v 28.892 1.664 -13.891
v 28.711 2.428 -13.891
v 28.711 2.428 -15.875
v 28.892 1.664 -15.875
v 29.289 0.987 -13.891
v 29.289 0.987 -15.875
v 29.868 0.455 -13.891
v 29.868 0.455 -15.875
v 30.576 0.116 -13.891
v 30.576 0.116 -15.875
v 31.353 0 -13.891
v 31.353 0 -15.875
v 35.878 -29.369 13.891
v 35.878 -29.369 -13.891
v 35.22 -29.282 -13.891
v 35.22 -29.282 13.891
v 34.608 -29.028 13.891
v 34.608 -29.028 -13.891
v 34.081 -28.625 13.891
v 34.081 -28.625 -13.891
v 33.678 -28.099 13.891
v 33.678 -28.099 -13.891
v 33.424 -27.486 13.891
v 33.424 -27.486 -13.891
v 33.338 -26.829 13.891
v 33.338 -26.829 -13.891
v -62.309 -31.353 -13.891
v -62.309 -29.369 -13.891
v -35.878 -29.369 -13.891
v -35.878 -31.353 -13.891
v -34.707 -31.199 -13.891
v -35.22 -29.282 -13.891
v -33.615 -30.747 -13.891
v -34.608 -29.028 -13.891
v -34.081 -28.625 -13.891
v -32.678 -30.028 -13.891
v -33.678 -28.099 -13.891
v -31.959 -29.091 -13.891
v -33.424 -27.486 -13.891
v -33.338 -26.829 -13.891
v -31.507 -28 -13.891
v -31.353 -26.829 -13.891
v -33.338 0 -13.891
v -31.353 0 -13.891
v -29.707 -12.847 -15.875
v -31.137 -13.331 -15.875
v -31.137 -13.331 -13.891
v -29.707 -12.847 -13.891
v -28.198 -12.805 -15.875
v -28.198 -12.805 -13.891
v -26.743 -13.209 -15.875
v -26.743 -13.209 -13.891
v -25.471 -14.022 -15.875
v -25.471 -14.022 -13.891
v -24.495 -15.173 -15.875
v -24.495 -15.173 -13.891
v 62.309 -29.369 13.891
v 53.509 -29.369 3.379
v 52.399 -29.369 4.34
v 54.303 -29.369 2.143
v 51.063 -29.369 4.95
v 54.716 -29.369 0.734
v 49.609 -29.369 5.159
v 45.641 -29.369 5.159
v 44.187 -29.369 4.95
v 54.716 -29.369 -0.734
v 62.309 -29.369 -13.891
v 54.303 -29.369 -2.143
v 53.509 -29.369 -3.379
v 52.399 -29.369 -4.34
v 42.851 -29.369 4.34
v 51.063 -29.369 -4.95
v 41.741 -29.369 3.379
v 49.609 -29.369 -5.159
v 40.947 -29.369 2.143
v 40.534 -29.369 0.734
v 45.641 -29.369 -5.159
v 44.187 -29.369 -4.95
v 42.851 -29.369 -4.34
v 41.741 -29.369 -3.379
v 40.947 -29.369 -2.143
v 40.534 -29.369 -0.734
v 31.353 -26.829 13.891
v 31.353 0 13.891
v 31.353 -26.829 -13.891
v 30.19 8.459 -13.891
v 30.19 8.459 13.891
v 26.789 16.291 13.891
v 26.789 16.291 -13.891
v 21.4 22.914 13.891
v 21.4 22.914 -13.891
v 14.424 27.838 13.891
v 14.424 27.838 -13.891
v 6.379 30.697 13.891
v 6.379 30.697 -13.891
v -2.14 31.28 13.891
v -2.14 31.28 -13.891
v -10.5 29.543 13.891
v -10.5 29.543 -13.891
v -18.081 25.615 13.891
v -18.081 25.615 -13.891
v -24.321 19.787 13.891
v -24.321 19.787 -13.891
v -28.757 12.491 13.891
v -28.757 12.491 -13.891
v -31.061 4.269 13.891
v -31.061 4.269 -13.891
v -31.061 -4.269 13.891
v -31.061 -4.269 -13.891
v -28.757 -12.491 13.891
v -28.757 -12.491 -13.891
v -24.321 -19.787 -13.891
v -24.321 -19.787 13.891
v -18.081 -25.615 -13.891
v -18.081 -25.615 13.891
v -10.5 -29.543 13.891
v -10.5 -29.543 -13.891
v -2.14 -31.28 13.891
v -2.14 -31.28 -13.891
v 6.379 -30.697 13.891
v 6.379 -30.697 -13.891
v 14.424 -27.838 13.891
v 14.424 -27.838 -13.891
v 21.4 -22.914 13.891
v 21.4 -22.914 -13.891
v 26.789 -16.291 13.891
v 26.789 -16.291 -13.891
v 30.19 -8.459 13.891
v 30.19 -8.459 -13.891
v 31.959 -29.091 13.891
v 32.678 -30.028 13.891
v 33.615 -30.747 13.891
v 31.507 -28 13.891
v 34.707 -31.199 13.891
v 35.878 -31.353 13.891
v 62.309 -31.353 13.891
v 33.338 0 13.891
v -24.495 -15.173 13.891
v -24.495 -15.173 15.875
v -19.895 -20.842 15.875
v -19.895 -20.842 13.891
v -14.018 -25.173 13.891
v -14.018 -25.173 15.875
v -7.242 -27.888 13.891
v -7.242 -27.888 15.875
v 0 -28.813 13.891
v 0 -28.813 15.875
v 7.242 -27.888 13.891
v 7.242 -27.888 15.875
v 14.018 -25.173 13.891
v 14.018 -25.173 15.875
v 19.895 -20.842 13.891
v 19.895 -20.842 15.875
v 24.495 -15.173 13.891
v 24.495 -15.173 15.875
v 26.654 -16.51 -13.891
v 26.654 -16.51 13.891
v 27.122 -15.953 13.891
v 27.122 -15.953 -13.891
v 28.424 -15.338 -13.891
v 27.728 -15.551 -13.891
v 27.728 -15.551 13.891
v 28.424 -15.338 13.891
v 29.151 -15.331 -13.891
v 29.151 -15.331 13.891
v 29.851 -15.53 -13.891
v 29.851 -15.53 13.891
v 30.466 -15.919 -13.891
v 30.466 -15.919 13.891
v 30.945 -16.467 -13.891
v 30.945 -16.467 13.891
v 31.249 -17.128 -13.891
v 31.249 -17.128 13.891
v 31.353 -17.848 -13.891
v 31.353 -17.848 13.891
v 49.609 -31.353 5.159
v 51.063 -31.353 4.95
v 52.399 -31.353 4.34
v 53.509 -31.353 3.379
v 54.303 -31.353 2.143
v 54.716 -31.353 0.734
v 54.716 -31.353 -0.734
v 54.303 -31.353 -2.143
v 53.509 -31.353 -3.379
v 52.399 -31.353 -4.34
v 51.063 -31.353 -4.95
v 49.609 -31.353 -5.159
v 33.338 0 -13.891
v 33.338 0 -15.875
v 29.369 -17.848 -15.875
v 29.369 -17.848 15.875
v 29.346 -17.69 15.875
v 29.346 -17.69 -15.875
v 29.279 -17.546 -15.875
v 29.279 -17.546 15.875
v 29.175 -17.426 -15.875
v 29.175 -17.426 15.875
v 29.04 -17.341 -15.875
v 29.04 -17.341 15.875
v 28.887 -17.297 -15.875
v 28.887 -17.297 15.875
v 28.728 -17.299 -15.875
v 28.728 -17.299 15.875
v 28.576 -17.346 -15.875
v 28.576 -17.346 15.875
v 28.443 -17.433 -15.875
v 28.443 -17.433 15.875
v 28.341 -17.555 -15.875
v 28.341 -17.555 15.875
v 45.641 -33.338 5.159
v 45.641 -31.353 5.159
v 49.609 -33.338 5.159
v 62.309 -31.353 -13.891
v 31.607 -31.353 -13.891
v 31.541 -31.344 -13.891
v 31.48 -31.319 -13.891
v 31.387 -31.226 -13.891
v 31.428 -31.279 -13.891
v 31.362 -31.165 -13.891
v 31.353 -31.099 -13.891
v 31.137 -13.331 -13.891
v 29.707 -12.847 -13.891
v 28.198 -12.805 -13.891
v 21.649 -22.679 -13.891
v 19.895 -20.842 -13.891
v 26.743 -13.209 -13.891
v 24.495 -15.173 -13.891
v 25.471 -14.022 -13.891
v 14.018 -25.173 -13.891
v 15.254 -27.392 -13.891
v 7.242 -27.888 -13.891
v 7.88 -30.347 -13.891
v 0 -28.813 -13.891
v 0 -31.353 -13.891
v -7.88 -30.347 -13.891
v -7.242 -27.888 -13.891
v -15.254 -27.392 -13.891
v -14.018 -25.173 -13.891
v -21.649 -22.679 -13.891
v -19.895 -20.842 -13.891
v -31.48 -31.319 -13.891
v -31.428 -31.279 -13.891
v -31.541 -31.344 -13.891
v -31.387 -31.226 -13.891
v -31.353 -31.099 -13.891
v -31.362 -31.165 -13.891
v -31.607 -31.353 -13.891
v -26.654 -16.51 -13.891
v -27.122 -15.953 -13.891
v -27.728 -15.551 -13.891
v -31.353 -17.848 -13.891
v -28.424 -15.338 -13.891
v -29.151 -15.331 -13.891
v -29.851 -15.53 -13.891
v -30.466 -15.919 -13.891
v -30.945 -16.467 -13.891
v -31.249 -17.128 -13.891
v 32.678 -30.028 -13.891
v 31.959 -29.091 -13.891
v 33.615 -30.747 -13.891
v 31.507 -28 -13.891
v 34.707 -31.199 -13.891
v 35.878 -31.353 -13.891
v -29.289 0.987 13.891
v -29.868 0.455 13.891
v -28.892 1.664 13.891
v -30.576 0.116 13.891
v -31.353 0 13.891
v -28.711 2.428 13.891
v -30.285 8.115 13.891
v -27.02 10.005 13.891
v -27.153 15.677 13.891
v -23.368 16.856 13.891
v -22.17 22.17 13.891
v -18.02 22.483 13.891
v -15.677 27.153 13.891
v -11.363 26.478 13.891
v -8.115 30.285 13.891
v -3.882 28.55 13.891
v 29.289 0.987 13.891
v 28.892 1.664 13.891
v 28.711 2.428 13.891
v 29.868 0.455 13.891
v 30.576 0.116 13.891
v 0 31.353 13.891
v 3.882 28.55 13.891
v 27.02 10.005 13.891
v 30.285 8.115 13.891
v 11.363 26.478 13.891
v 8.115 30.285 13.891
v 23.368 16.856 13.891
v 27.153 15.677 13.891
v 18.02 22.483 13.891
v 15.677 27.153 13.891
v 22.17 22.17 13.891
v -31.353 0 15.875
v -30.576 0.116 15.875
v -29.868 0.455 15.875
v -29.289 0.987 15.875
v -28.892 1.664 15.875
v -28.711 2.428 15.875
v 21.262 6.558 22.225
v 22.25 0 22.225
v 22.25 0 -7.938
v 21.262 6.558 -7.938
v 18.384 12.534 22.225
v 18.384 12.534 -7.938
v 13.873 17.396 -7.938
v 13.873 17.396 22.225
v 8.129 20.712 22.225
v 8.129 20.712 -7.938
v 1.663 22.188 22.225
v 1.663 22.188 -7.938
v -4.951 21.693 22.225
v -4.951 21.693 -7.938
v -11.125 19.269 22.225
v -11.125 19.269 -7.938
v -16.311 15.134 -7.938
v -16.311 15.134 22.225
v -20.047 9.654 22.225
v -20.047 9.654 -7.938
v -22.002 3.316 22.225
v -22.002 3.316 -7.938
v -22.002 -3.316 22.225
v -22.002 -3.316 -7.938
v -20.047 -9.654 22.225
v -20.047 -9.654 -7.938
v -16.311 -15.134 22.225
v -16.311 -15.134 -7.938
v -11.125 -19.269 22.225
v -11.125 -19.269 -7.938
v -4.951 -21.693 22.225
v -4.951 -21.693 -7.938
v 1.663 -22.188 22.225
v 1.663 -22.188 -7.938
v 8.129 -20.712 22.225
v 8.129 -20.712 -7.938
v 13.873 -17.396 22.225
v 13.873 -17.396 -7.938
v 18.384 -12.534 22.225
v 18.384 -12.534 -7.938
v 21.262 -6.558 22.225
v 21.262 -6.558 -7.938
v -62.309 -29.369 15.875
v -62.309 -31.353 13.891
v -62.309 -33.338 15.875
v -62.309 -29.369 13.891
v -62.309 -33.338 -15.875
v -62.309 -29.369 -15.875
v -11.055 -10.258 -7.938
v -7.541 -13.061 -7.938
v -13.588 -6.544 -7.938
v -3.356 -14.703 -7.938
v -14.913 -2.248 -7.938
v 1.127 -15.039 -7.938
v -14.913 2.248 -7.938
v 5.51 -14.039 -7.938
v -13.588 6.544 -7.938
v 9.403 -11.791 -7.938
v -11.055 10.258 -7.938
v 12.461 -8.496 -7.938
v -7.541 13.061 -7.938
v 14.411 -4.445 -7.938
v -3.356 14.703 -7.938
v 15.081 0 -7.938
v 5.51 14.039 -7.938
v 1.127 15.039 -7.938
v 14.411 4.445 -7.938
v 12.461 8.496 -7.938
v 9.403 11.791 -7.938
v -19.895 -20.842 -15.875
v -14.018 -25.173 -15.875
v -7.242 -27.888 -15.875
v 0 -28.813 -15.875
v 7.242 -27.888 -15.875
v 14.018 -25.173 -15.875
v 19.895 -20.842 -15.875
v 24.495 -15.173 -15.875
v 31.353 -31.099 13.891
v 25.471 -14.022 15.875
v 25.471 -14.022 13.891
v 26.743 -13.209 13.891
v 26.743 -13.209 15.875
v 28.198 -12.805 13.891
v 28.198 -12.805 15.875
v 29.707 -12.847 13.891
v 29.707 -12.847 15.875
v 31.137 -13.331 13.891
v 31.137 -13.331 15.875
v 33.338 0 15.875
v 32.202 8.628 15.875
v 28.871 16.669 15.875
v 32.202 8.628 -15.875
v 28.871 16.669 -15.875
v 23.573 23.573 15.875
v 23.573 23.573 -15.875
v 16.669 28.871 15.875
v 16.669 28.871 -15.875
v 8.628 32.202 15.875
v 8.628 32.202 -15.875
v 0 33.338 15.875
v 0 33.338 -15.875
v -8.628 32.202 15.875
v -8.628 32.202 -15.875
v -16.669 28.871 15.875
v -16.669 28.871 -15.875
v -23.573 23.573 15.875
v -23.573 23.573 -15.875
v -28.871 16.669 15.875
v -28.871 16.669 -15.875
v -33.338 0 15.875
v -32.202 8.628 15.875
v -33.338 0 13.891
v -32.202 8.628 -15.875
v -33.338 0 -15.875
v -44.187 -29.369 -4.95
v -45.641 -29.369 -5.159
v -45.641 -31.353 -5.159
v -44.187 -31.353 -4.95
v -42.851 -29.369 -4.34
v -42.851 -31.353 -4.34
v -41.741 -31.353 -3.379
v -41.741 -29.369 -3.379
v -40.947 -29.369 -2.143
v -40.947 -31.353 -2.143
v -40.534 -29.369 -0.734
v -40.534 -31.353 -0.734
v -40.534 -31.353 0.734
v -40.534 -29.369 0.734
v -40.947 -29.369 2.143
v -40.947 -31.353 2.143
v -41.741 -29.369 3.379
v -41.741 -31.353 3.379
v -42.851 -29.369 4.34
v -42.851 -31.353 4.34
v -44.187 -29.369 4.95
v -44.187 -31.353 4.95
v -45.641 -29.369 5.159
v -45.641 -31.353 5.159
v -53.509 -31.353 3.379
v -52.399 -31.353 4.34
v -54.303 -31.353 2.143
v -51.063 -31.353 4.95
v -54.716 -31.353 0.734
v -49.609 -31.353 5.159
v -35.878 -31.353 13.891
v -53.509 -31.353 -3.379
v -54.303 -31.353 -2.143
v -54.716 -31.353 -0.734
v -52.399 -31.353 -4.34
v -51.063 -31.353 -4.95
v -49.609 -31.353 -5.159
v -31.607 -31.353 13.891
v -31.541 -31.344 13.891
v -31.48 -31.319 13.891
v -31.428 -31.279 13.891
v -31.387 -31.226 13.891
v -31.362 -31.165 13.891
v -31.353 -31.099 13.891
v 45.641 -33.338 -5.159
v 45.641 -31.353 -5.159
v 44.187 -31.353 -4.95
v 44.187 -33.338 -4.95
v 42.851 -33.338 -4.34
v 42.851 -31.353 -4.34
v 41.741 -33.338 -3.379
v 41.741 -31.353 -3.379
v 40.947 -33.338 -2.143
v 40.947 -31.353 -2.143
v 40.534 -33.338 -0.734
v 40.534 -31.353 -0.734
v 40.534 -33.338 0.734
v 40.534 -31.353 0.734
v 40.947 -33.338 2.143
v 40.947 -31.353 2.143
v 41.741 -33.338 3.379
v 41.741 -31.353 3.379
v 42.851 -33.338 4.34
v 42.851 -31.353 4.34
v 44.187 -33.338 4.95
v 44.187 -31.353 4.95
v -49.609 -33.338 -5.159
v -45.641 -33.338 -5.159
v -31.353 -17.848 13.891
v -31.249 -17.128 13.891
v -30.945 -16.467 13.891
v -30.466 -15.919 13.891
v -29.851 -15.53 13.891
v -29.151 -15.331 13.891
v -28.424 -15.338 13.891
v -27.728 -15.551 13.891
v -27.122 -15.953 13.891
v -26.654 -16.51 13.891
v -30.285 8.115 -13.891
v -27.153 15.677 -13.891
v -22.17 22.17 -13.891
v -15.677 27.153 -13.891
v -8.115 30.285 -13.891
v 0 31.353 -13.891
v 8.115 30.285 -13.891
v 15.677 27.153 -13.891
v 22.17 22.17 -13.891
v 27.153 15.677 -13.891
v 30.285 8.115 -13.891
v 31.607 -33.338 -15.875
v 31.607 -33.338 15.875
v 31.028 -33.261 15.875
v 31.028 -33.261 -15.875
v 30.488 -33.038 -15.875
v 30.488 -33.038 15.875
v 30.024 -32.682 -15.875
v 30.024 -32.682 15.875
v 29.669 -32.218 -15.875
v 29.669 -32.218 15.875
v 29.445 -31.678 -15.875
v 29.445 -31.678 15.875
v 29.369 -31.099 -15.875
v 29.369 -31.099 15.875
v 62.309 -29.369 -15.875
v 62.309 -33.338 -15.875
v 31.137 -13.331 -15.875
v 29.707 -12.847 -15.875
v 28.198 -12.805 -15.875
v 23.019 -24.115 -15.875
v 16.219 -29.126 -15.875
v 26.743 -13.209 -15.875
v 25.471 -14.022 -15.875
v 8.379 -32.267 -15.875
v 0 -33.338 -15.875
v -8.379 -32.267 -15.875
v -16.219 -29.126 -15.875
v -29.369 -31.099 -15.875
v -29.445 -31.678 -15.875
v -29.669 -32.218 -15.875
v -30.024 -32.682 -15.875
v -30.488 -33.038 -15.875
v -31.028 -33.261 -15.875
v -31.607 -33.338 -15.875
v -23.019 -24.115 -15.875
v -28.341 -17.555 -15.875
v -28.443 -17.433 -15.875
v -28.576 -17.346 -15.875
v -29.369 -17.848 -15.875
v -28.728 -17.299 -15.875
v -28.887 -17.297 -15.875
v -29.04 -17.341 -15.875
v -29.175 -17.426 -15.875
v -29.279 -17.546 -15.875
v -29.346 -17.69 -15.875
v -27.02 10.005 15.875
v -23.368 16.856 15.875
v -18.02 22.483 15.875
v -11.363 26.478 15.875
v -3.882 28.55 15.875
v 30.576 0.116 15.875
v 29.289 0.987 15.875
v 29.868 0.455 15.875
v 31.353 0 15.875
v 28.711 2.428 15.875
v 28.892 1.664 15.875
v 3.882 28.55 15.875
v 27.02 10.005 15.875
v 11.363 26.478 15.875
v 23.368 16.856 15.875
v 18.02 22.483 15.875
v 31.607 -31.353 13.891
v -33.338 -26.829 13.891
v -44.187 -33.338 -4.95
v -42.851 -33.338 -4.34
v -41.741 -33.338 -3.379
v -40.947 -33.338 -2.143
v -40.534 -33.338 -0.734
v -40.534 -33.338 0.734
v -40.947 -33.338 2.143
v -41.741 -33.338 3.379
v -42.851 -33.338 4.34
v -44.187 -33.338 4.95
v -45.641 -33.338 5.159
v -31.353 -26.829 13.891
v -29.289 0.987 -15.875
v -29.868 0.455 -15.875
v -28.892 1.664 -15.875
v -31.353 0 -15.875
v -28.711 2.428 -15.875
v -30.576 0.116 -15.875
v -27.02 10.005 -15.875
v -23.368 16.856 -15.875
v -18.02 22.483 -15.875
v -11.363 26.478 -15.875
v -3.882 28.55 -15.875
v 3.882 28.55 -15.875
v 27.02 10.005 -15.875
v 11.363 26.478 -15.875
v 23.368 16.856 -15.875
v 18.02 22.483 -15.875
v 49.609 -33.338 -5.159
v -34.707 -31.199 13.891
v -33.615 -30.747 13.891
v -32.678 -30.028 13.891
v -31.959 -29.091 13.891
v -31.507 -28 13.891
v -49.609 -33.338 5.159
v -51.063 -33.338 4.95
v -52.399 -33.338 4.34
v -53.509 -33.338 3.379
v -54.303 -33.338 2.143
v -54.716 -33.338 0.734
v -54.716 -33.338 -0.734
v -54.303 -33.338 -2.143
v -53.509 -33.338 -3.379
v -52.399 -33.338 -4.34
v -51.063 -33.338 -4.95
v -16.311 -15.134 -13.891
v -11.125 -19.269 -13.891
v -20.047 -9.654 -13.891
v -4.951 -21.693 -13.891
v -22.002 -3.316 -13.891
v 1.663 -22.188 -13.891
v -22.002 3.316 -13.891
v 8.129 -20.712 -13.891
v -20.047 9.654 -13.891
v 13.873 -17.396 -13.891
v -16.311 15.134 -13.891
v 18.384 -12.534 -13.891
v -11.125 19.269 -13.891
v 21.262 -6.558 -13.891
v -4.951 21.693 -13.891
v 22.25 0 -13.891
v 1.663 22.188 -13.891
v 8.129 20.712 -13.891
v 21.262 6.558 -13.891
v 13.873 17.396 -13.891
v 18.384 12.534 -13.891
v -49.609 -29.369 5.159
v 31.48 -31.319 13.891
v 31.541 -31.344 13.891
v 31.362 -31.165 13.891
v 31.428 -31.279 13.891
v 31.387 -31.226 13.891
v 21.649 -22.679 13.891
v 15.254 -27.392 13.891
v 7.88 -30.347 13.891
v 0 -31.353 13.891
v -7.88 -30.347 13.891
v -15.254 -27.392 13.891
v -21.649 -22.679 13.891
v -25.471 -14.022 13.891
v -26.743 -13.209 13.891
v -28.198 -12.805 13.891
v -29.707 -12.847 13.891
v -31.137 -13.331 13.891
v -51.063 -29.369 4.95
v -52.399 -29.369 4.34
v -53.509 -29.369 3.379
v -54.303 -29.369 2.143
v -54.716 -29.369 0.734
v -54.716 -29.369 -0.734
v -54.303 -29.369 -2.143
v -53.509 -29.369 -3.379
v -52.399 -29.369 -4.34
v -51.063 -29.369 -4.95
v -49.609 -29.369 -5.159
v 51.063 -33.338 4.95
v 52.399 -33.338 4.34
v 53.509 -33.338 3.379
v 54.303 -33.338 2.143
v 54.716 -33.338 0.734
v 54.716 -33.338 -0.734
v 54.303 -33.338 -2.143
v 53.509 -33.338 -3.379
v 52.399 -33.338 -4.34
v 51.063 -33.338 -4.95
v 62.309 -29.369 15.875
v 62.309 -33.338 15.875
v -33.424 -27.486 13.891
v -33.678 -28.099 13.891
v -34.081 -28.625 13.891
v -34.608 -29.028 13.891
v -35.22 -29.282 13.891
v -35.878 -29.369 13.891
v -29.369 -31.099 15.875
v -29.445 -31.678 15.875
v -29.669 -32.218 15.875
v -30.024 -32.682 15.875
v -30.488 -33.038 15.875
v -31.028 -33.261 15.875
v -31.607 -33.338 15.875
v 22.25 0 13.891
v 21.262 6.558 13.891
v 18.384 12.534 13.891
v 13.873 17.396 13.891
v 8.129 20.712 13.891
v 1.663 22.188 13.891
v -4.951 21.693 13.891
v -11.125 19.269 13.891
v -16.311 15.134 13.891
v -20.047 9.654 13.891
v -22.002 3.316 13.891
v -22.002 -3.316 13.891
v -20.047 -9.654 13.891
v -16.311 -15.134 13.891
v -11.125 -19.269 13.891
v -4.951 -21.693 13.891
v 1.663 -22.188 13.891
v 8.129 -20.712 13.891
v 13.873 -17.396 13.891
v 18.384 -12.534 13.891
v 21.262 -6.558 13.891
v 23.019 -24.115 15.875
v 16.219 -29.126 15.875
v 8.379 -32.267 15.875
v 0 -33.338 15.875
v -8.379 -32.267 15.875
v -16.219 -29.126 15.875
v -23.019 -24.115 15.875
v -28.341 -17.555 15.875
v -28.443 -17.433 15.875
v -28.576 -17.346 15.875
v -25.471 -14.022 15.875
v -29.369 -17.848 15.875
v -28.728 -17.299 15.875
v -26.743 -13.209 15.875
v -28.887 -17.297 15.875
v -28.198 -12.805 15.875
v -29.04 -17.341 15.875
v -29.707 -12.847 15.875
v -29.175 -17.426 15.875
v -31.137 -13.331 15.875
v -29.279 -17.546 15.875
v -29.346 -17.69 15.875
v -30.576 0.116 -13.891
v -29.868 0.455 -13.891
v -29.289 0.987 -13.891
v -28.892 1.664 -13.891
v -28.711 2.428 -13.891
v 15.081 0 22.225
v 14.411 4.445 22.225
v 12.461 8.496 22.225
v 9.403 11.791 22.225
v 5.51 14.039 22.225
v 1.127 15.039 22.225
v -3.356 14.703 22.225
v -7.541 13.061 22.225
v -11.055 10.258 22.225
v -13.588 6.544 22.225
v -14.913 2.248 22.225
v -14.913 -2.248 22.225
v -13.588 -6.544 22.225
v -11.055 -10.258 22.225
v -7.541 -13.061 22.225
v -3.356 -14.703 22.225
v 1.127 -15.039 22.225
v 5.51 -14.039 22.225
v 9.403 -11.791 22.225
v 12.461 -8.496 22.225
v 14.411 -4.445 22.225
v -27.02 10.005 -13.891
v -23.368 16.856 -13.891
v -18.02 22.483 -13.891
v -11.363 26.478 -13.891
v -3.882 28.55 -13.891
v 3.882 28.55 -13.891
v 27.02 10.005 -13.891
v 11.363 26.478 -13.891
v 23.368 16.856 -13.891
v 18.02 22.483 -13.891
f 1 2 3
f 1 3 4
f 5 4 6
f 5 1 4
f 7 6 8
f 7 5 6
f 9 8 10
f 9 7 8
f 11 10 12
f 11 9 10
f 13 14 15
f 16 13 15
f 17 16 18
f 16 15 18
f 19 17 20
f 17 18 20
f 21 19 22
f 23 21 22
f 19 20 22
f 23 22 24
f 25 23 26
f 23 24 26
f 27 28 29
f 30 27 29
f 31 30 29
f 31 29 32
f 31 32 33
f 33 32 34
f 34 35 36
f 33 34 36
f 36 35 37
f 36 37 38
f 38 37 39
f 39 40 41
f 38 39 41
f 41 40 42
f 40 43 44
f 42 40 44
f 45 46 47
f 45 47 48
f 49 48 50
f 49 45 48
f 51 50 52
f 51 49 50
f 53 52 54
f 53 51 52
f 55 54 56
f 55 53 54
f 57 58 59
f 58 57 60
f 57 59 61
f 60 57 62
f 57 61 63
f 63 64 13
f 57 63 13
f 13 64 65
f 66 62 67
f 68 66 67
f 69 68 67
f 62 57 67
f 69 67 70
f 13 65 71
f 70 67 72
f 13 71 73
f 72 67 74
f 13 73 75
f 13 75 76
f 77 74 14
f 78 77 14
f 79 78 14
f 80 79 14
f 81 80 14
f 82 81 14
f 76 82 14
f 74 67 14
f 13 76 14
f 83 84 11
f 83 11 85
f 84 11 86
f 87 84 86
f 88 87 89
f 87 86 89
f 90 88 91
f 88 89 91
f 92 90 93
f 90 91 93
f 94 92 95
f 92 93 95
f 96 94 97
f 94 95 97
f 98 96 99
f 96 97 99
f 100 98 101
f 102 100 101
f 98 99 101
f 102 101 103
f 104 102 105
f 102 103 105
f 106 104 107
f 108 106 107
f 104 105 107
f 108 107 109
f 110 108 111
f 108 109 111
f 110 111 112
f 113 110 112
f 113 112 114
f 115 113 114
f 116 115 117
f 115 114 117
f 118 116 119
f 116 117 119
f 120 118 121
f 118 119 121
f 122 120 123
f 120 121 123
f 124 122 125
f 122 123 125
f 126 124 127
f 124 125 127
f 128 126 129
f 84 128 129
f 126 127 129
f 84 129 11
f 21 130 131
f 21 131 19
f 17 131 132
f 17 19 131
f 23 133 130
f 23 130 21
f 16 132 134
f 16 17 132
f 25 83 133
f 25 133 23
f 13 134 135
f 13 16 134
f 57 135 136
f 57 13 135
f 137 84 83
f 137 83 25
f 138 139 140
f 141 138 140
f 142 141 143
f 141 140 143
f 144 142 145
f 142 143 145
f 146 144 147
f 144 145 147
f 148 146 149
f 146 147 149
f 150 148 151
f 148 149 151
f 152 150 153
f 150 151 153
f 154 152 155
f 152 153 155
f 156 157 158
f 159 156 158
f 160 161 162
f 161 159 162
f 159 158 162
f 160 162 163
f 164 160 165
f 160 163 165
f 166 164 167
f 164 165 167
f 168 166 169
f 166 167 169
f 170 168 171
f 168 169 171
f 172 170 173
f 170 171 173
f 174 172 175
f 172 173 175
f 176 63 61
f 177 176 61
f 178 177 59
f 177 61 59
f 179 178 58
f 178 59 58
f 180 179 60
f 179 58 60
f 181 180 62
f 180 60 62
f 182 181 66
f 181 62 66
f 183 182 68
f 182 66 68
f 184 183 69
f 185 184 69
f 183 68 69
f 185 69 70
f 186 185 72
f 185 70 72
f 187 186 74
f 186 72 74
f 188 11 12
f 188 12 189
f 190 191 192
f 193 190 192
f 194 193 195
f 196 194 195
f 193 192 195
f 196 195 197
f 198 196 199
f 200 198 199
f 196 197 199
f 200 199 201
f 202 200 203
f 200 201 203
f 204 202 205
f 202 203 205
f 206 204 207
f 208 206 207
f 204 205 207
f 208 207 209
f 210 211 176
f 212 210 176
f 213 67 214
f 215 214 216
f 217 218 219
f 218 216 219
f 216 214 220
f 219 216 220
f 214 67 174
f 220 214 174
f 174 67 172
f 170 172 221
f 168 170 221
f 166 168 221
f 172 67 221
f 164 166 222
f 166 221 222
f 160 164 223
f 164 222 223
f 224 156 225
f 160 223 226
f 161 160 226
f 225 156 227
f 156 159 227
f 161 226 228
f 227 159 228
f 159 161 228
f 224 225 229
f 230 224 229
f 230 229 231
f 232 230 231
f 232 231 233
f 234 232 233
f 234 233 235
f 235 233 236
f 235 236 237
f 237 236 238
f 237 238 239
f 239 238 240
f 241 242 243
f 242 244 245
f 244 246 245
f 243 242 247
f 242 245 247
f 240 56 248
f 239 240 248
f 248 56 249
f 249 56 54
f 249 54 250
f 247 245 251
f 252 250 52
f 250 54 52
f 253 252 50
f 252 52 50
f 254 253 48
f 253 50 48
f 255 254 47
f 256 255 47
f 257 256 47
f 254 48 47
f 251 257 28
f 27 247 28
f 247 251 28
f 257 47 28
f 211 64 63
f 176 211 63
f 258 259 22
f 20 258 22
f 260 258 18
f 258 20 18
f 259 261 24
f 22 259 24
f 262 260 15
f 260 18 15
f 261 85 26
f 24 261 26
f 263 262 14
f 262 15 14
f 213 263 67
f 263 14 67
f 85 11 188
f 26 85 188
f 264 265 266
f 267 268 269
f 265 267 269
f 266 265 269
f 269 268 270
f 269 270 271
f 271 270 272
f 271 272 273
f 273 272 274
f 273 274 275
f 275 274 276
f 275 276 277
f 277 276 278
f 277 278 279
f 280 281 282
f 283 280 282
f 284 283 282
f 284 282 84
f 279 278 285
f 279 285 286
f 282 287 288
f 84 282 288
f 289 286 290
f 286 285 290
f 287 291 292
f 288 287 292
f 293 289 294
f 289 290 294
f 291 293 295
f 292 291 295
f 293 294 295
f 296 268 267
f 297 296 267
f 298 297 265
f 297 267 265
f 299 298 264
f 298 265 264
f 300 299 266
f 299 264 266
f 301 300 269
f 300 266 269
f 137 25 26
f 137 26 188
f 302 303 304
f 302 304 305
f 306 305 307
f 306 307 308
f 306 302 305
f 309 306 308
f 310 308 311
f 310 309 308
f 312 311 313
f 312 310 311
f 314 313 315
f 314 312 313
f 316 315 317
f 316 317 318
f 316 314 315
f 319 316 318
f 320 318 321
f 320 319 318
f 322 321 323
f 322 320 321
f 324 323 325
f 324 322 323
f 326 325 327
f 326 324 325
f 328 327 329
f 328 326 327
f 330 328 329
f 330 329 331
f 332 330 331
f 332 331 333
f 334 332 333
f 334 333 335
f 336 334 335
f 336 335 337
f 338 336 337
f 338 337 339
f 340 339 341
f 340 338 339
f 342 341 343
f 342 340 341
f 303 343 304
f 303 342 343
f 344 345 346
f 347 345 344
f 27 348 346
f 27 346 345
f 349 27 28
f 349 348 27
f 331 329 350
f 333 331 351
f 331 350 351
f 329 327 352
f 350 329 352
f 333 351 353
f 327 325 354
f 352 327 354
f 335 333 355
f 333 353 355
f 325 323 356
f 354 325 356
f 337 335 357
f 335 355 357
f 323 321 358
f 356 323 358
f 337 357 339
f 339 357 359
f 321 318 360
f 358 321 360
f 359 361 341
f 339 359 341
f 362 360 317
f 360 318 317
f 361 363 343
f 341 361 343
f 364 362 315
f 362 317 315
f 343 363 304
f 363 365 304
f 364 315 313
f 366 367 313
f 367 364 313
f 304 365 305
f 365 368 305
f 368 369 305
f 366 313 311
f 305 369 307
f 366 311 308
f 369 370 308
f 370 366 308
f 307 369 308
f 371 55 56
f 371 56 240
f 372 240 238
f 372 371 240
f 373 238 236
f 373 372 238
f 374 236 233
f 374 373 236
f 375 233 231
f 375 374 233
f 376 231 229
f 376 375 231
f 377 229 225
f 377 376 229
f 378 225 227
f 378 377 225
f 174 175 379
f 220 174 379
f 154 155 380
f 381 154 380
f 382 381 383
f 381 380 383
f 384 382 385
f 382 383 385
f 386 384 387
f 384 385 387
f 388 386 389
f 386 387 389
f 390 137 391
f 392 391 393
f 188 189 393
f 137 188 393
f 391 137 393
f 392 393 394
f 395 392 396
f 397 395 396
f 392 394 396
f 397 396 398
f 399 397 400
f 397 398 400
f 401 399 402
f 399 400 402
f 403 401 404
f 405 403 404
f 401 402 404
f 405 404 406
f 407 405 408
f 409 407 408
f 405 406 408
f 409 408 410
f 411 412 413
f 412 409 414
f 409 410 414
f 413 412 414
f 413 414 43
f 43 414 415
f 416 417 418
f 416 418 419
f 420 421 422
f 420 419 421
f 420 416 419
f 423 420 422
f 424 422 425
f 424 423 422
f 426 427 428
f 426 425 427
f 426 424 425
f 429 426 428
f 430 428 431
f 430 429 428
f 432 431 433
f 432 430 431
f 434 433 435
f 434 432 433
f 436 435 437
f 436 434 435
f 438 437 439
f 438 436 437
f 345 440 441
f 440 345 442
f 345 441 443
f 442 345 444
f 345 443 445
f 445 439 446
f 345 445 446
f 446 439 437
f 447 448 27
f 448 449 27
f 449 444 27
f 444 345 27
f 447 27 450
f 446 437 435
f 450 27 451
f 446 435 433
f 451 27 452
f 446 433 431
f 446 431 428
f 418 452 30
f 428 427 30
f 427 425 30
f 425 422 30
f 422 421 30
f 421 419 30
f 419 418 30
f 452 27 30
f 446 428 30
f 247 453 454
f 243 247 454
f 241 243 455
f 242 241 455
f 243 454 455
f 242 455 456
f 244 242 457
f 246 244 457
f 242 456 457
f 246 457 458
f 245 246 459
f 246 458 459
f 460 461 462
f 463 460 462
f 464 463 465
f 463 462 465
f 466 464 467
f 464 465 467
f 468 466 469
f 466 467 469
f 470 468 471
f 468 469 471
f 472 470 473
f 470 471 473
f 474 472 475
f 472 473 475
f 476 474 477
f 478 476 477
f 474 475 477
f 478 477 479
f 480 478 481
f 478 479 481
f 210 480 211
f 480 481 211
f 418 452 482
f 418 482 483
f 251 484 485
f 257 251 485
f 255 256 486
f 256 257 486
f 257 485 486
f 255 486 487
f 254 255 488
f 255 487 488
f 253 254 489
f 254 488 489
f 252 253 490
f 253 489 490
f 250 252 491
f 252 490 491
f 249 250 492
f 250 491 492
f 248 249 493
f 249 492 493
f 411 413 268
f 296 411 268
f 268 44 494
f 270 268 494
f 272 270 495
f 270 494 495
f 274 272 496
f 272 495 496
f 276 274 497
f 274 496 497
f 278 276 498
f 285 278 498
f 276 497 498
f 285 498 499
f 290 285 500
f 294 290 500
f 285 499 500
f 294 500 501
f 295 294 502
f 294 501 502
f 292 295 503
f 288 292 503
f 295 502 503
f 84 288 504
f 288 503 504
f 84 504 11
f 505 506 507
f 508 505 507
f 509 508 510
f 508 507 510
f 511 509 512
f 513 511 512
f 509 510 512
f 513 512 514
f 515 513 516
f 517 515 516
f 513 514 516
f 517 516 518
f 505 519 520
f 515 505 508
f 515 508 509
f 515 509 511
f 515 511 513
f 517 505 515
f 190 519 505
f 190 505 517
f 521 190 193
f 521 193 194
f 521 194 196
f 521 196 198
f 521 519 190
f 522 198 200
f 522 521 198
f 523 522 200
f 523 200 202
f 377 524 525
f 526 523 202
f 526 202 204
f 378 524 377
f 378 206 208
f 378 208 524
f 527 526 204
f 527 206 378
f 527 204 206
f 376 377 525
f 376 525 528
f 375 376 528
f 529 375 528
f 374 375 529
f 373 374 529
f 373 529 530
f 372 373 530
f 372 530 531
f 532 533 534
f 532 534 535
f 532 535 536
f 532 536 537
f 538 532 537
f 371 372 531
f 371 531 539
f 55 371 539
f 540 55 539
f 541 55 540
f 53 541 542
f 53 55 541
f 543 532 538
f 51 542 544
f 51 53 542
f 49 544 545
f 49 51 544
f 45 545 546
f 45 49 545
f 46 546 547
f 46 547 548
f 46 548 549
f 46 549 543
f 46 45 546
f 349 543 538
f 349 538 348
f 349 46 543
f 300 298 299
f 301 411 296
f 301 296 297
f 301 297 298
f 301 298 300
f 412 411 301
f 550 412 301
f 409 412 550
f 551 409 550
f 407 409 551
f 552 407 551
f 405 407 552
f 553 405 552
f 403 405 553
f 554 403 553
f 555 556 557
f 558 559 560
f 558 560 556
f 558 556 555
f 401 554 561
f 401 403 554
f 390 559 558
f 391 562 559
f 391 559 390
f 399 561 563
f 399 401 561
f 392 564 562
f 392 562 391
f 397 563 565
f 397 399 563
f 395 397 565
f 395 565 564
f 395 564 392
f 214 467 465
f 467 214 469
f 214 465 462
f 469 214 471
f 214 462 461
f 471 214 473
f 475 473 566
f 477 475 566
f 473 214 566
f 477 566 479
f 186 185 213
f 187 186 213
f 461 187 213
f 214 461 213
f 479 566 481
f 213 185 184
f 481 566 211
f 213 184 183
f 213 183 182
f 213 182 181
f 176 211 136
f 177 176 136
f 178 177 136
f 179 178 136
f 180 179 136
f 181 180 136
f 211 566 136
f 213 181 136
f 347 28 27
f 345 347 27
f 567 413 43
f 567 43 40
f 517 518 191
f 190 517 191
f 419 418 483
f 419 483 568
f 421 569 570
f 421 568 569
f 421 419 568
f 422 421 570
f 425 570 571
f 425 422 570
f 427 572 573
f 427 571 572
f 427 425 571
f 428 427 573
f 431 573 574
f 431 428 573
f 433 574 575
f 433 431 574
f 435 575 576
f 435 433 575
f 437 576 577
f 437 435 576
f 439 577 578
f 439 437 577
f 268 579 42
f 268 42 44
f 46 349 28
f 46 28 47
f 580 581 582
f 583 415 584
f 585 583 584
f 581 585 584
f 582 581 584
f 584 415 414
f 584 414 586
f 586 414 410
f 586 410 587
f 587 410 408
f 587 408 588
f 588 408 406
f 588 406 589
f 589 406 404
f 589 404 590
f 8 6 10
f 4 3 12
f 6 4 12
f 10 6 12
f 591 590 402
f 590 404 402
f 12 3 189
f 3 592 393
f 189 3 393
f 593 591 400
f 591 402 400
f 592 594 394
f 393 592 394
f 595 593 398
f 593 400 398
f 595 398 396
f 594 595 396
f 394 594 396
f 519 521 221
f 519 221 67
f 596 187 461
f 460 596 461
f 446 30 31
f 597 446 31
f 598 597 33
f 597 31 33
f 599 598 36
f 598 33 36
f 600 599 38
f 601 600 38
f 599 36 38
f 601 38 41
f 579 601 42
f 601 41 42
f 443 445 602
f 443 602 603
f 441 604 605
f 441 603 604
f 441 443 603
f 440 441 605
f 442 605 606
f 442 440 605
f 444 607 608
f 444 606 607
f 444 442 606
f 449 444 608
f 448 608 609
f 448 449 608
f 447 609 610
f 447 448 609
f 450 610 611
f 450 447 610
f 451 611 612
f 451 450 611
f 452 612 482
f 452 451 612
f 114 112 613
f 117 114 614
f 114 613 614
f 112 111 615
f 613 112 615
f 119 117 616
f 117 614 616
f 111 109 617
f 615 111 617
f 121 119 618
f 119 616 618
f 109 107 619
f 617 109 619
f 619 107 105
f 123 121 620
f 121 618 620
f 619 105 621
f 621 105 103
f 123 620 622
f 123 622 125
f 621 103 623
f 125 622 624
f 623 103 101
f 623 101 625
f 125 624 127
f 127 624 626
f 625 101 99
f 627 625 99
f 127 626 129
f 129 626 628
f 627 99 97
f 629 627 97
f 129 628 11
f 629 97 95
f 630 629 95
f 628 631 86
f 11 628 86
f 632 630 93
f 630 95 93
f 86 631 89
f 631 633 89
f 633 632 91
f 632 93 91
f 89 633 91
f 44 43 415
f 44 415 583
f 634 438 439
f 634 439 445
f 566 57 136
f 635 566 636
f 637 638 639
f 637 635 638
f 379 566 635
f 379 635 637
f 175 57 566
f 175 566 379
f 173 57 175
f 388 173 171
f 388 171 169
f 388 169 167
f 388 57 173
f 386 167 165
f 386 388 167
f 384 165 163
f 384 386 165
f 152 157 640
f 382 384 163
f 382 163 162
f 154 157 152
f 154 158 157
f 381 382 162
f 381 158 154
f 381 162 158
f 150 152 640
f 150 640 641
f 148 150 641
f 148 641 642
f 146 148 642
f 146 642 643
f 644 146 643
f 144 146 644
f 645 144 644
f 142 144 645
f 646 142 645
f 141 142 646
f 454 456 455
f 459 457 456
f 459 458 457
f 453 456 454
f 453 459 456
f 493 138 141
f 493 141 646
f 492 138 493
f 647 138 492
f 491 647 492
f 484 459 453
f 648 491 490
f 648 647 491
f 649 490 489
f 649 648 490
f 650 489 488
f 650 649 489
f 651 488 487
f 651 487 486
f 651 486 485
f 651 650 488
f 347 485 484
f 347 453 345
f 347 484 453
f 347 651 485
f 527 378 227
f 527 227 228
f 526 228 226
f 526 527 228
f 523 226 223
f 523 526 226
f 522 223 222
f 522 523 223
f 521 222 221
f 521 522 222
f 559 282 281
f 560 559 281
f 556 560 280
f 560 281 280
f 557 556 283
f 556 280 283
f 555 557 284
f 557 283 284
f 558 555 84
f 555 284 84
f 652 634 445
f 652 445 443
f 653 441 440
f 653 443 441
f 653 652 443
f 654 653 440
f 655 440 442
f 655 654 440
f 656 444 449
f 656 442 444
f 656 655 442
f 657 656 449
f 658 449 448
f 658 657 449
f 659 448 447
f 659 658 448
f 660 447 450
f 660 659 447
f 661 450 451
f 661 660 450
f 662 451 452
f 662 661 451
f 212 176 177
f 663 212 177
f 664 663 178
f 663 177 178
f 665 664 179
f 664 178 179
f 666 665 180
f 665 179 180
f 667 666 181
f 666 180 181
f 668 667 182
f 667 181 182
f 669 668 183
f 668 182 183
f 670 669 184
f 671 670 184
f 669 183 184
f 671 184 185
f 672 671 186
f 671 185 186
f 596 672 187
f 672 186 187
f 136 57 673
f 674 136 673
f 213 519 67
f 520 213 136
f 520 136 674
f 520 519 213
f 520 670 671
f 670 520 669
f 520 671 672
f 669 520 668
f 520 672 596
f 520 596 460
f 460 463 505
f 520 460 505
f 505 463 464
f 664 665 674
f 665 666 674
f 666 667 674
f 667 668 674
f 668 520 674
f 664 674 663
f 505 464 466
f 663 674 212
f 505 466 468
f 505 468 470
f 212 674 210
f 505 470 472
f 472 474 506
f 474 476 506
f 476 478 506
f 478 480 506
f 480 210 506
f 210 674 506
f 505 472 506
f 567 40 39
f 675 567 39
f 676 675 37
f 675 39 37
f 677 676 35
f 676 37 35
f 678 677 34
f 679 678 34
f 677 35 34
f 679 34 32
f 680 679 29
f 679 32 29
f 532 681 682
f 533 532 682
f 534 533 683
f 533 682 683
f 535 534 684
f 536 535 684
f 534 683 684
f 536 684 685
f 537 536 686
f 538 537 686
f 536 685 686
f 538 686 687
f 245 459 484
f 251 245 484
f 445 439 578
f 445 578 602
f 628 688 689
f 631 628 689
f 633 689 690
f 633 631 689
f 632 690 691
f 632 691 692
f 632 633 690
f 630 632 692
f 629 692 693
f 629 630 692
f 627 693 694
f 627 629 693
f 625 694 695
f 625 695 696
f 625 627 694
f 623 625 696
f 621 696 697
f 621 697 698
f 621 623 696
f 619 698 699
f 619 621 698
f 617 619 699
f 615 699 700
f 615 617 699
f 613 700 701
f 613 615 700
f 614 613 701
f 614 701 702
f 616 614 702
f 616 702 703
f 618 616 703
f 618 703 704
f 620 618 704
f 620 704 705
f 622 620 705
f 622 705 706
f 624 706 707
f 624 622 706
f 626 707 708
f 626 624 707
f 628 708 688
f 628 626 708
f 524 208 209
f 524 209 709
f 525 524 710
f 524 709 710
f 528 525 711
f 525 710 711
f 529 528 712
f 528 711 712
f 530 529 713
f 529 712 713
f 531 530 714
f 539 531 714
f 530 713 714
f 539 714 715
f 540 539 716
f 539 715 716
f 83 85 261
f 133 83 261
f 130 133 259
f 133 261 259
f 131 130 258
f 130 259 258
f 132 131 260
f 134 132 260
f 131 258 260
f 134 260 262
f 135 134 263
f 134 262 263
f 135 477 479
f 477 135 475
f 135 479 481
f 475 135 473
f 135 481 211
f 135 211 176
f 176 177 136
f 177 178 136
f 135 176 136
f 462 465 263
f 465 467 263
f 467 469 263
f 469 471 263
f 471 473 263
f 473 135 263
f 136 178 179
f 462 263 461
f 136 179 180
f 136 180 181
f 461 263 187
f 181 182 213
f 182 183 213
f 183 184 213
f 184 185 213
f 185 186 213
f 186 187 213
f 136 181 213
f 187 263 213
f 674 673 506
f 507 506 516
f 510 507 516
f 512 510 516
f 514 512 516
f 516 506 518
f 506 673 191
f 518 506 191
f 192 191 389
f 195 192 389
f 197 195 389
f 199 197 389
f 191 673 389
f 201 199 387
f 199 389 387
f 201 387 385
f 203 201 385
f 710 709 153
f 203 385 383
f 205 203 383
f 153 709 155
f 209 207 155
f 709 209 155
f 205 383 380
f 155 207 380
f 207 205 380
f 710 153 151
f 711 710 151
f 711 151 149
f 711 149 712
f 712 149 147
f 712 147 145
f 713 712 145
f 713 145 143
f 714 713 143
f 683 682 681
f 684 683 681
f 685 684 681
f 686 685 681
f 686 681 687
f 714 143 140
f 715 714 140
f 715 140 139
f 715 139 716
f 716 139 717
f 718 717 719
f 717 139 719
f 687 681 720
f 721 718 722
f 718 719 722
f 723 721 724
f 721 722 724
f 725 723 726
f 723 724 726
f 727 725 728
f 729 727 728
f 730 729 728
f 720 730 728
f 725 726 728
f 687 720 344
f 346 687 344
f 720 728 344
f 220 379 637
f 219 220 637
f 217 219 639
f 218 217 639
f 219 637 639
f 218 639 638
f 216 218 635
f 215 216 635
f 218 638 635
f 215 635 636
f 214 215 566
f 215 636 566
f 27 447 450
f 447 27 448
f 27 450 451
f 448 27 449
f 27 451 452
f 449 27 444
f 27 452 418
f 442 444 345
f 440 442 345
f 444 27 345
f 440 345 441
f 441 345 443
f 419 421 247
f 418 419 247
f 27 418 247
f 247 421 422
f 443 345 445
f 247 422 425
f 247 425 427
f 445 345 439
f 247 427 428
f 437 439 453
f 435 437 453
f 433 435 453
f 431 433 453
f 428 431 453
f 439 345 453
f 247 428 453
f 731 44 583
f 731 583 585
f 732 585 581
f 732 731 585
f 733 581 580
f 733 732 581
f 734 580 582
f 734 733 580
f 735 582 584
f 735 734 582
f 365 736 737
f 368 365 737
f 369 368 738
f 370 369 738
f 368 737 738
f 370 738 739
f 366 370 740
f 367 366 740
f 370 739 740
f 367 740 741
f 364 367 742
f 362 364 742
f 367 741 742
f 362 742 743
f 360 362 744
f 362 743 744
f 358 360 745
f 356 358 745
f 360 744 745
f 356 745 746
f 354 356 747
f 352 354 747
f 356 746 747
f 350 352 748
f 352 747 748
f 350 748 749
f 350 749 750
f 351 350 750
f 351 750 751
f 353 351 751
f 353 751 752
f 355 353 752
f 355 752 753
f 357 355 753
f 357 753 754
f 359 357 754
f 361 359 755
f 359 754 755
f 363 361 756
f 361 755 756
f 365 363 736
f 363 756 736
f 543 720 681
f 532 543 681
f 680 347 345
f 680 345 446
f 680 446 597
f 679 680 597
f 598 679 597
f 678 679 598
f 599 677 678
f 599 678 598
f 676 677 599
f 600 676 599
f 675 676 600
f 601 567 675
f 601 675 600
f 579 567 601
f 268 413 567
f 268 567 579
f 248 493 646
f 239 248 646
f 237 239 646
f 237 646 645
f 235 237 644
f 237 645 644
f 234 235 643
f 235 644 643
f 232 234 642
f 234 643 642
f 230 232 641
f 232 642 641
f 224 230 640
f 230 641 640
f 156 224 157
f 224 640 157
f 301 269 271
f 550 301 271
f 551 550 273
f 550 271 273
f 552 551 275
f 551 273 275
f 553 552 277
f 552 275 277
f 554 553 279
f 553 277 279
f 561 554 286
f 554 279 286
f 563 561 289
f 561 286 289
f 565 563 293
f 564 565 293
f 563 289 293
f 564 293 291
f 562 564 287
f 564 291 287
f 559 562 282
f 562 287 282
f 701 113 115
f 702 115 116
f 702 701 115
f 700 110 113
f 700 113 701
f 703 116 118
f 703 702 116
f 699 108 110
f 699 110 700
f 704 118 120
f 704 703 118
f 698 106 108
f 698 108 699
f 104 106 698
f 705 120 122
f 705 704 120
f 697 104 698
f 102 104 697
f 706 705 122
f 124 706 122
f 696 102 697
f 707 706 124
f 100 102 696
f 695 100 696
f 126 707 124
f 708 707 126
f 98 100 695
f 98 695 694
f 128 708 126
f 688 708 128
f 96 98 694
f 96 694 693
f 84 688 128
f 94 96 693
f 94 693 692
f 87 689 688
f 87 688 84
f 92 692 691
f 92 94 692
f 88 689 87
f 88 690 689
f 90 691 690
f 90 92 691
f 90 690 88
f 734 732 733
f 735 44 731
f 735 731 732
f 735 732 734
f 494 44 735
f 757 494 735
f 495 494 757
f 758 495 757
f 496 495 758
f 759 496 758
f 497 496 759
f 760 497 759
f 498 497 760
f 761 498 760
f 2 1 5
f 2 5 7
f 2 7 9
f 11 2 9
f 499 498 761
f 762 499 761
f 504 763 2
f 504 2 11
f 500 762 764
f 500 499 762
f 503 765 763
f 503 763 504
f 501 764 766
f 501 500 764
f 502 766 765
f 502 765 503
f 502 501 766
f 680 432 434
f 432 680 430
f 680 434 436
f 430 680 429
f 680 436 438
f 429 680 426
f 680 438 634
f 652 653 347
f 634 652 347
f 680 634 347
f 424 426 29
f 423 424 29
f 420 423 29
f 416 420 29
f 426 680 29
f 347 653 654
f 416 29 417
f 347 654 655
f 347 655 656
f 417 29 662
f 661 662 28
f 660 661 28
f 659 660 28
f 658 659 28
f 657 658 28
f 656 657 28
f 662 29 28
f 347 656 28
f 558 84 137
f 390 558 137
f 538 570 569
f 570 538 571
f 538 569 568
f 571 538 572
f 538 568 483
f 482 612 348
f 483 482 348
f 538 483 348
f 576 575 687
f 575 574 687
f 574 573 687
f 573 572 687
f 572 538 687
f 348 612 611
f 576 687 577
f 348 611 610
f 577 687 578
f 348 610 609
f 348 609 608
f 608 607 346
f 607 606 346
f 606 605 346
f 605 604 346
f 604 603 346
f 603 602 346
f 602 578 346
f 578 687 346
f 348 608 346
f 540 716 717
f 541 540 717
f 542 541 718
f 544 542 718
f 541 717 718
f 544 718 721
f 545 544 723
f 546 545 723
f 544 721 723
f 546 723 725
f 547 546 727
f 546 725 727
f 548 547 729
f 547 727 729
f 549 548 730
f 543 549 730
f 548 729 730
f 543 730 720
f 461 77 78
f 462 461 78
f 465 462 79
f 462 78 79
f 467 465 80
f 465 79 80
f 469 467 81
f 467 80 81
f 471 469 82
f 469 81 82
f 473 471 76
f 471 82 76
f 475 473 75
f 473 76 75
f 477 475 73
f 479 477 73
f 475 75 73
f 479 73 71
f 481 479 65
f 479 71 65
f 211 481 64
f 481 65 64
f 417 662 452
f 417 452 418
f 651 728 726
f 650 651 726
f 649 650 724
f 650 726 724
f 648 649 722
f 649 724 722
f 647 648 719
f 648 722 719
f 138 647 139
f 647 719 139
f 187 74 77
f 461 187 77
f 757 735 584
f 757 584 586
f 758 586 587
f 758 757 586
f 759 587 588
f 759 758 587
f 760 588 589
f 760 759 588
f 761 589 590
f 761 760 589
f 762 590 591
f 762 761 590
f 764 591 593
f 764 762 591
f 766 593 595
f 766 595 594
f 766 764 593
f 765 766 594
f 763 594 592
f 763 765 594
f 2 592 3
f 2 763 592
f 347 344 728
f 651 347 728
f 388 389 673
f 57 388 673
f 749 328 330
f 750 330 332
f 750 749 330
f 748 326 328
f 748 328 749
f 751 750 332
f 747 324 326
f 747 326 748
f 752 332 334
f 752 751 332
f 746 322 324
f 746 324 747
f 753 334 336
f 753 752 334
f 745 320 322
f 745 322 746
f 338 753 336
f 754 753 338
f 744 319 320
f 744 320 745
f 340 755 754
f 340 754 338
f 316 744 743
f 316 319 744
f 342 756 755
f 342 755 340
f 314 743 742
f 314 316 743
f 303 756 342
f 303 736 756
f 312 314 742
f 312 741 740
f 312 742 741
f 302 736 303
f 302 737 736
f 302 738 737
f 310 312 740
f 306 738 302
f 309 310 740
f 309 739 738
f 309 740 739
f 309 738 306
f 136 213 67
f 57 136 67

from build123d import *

# Parameters (mm, degrees)
EXTRUDE_THIN2_DEPTH  = 15.875
EXTRUDE1_DEPTH       = 1.984375
EXTRUDE_THIN3_START  = -13.890625
EXTRUDE_THIN3_DEPTH  = 27.78125
EXTRUDE2_DEPTH       = 1.984375
EXTRUDE3_START       = -13.890625
EXTRUDE3_OUTLINE_R   = 31.353125
EXTRUDE3_OUTLINE_R_2 = 22.2504
EXTRUDE3_DEPTH       = 27.78125
SKETCH8_R            = 22.2504
SKETCH8_R_2          = 15.08125
EXTRUDE4_DEPTH       = 30.1625
CUT_EXTRUDE1_DEPTH   = 75.079671598


# Read off the part's stored shape, not the designer's step: Extrude-Thin3, Extrude3
with BuildPart() as part:
    # Sketch1 → Extrude-Thin2 (new, symmetric)
    with BuildSketch(Plane.XY):
        with BuildLine():
            Line((-62.309375, -31.353125), (-31.607125, -31.353125))
            ThreePointArc((-31.607125, -31.353125), (-31.427519878, -31.278730122), (-31.353125, -31.099125))
            Line((-31.353125, -31.099125), (-31.353125, -17.84790604))
            ThreePointArc((-31.353125, -17.84790604), (-29.508461085, -15.404934953), (-26.653827576, -16.510358046))
            ThreePointArc((-26.653827576, -16.510358046), (0, -31.353125), (26.653827576, -16.510358046))
            ThreePointArc((26.653827576, -16.510358046), (29.508461085, -15.404934953), (31.353125, -17.84790604))
            Line((31.353125, -17.84790604), (31.353125, -31.099125))
            ThreePointArc((31.353125, -31.099125), (31.427519878, -31.278730122), (31.607125, -31.353125))
            Line((31.607125, -31.353125), (62.309375, -31.353125))
            Line((62.309375, -31.353125), (62.309375, -33.3375))
            Line((62.309375, -33.3375), (31.607125, -33.3375))
            ThreePointArc((31.607125, -33.3375), (30.024354859, -32.681895141), (29.36875, -31.099125))
            Line((29.36875, -31.099125), (29.36875, -17.84790604))
            ThreePointArc((29.36875, -17.84790604), (28.965229769, -17.313506115), (28.340778689, -17.555317416))
            ThreePointArc((28.340778689, -17.555317416), (0, -33.3375), (-28.340778689, -17.555317416))
            ThreePointArc((-28.340778689, -17.555317416), (-28.965229769, -17.313506115), (-29.36875, -17.84790604))
            Line((-29.36875, -17.84790604), (-29.36875, -31.099125))
            ThreePointArc((-29.36875, -31.099125), (-30.024354859, -32.681895141), (-31.607125, -33.3375))
            Line((-31.607125, -33.3375), (-62.309375, -33.3375))
            Line((-62.309375, -33.3375), (-62.309375, -31.353125))
        make_face()
    extrude(amount=EXTRUDE_THIN2_DEPTH, both=True)

    # Sketch4 → Extrude1 (add)
    with BuildSketch(Plane.XY.offset(15.875)):
        with BuildLine():
            Line((-62.309375, -29.36875), (-31.137213521, -13.330715259))
            ThreePointArc((-31.137213521, -13.330715259), (-27.455611767, -12.952647331), (-24.494530152, -15.172810052))
            ThreePointArc((-24.494530152, -15.172810052), (0, -28.813125), (24.494530152, -15.172810052))
            ThreePointArc((24.494530152, -15.172810052), (27.455611767, -12.952647331), (31.137213521, -13.330715259))
            Line((31.137213521, -13.330715259), (62.309375, -29.36875))
            Line((62.309375, -29.36875), (62.309375, -33.3375))
            Line((62.309375, -33.3375), (31.607125, -33.3375))
            ThreePointArc((31.607125, -33.3375), (30.024354859, -32.681895141), (29.36875, -31.099125))
            Line((29.36875, -31.099125), (29.36875, -17.84790604))
            ThreePointArc((29.36875, -17.84790604), (28.965229769, -17.313506115), (28.340778689, -17.555317416))
            ThreePointArc((28.340778689, -17.555317416), (0, -33.3375), (-28.340778689, -17.555317416))
            ThreePointArc((-28.340778689, -17.555317416), (-28.965229769, -17.313506115), (-29.36875, -17.84790604))
            Line((-29.36875, -17.84790604), (-29.36875, -31.099125))
            ThreePointArc((-29.36875, -31.099125), (-30.024354859, -32.681895141), (-31.607125, -33.3375))
            Line((-31.607125, -33.3375), (-62.309375, -33.3375))
            Line((-62.309375, -33.3375), (-62.309375, -29.36875))
        make_face()
    extrude1 = extrude(amount=-EXTRUDE1_DEPTH)

    # Mirror1: Extrude1 across plane
    add(extrude1.mirror(Plane.XY))


with BuildPart() as body_2:
    # Extrude-Thin3 outline → Extrude-Thin3 (new body)
    with BuildSketch(Plane.XY.offset(EXTRUDE_THIN3_START)):
        with BuildLine():
            Line((-35.8775, -29.36875), (-62.309375, -29.36875))
            Line((-62.309375, -29.36875), (-62.309375, -31.353125))
            Line((-62.309375, -31.353125), (-35.8775, -31.353125))
            ThreePointArc((-35.8775, -31.353125), (-32.678283757, -30.027966243), (-31.353125, -26.82875))
            Line((-31.353125, -26.82875), (-31.353125, 0))
            ThreePointArc((-31.353125, 0), (0, 31.353125), (31.353125, 0))
            Line((31.353125, 0), (31.353125, -26.82875))
            ThreePointArc((31.353125, -26.82875), (32.678283757, -30.027966243), (35.8775, -31.353125))
            Line((35.8775, -31.353125), (62.309375, -31.353125))
            Line((62.309375, -31.353125), (62.309375, -29.36875))
            Line((62.309375, -29.36875), (35.8775, -29.36875))
            ThreePointArc((35.8775, -29.36875), (34.081448776, -28.624801224), (33.3375, -26.82875))
            Line((33.3375, -26.82875), (33.3375, 0))
            ThreePointArc((33.3375, 0), (0, 33.3375), (-33.3375, 0))
            Line((-33.3375, 0), (-33.3375, -26.82875))
            ThreePointArc((-33.3375, -26.82875), (-34.081448776, -28.624801224), (-35.8775, -29.36875))
        make_face()
    extrude(amount=EXTRUDE_THIN3_DEPTH)

    # Sketch6 → Extrude2 (add)
    with BuildSketch(Plane(origin=(0, 0, -13.890625), x_dir=(-1, 0, 0), z_dir=(0, 0, -1))):
        with BuildLine():
            Line((-31.353125, 0), (-33.3375, 0))
            ThreePointArc((-33.3375, 0), (0, 33.3375), (33.3375, 0))
            Line((33.3375, 0), (31.353125, 0))
            ThreePointArc((31.353125, 0), (29.55867212, 0.699314359), (28.710605003, 2.428442428))
            ThreePointArc((28.710605003, 2.428442428), (0, 28.813125), (-28.710605003, 2.428442428))
            ThreePointArc((-28.710605003, 2.428442428), (-29.55867212, 0.699314359), (-31.353125, 0))
        make_face()
    extrude2 = extrude(amount=EXTRUDE2_DEPTH)

    # Mirror2: Extrude2 across plane
    add(extrude2.mirror(Plane.XY))


with BuildPart() as body_3:
    # Extrude3 outline → Extrude3 (new body)
    with BuildSketch(Plane.XY.offset(EXTRUDE3_START)):
        Circle(EXTRUDE3_OUTLINE_R)
        Circle(EXTRUDE3_OUTLINE_R_2, mode=Mode.SUBTRACT)
    extrude(amount=EXTRUDE3_DEPTH)


with BuildPart() as body_4:
    # Sketch8 → Extrude4 (new body)
    with BuildSketch(Plane.XY.offset(22.225)):
        Circle(SKETCH8_R)
        Circle(SKETCH8_R_2, mode=Mode.SUBTRACT)
    extrude(amount=-EXTRUDE4_DEPTH)


with BuildPart() as cut_extrude1_tool:
    # Sketch3 → Cut-Extrude1 (new, through all)
    with BuildSketch(Plane(origin=(0, 0, 0), x_dir=(1, 0, 0), z_dir=(0, 1, 0))):
        with BuildLine():
            Line((-49.609375, 5.159375), (-45.640625, 5.159375))
            ThreePointArc((-45.640625, 5.159375), (-40.48125, 0), (-45.640625, -5.159375))
            Line((-45.640625, -5.159375), (-49.609375, -5.159375))
            ThreePointArc((-49.609375, -5.159375), (-54.76875, 0), (-49.609375, 5.159375))
        make_face()
        with BuildLine():
            Line((45.640625, -5.159375), (49.609375, -5.159375))
            ThreePointArc((49.609375, -5.159375), (54.76875, 0), (49.609375, 5.159375))
            Line((49.609375, 5.159375), (45.640625, 5.159375))
            ThreePointArc((45.640625, 5.159375), (40.48125, 0), (45.640625, -5.159375))
        make_face()
    extrude(amount=-CUT_EXTRUDE1_DEPTH)


with BuildPart() as part_1:
    add(part.part)

    # Cut-Extrude1: cut by cut_extrude1_tool
    add(cut_extrude1_tool.part, mode=Mode.SUBTRACT)


with BuildPart() as body_2_1:
    add(body_2.part)

    # Cut-Extrude1: cut by cut_extrude1_tool
    add(cut_extrude1_tool.part, mode=Mode.SUBTRACT)


solid = Compound([body_3.part, body_4.part, part_1.part, body_2_1.part])
